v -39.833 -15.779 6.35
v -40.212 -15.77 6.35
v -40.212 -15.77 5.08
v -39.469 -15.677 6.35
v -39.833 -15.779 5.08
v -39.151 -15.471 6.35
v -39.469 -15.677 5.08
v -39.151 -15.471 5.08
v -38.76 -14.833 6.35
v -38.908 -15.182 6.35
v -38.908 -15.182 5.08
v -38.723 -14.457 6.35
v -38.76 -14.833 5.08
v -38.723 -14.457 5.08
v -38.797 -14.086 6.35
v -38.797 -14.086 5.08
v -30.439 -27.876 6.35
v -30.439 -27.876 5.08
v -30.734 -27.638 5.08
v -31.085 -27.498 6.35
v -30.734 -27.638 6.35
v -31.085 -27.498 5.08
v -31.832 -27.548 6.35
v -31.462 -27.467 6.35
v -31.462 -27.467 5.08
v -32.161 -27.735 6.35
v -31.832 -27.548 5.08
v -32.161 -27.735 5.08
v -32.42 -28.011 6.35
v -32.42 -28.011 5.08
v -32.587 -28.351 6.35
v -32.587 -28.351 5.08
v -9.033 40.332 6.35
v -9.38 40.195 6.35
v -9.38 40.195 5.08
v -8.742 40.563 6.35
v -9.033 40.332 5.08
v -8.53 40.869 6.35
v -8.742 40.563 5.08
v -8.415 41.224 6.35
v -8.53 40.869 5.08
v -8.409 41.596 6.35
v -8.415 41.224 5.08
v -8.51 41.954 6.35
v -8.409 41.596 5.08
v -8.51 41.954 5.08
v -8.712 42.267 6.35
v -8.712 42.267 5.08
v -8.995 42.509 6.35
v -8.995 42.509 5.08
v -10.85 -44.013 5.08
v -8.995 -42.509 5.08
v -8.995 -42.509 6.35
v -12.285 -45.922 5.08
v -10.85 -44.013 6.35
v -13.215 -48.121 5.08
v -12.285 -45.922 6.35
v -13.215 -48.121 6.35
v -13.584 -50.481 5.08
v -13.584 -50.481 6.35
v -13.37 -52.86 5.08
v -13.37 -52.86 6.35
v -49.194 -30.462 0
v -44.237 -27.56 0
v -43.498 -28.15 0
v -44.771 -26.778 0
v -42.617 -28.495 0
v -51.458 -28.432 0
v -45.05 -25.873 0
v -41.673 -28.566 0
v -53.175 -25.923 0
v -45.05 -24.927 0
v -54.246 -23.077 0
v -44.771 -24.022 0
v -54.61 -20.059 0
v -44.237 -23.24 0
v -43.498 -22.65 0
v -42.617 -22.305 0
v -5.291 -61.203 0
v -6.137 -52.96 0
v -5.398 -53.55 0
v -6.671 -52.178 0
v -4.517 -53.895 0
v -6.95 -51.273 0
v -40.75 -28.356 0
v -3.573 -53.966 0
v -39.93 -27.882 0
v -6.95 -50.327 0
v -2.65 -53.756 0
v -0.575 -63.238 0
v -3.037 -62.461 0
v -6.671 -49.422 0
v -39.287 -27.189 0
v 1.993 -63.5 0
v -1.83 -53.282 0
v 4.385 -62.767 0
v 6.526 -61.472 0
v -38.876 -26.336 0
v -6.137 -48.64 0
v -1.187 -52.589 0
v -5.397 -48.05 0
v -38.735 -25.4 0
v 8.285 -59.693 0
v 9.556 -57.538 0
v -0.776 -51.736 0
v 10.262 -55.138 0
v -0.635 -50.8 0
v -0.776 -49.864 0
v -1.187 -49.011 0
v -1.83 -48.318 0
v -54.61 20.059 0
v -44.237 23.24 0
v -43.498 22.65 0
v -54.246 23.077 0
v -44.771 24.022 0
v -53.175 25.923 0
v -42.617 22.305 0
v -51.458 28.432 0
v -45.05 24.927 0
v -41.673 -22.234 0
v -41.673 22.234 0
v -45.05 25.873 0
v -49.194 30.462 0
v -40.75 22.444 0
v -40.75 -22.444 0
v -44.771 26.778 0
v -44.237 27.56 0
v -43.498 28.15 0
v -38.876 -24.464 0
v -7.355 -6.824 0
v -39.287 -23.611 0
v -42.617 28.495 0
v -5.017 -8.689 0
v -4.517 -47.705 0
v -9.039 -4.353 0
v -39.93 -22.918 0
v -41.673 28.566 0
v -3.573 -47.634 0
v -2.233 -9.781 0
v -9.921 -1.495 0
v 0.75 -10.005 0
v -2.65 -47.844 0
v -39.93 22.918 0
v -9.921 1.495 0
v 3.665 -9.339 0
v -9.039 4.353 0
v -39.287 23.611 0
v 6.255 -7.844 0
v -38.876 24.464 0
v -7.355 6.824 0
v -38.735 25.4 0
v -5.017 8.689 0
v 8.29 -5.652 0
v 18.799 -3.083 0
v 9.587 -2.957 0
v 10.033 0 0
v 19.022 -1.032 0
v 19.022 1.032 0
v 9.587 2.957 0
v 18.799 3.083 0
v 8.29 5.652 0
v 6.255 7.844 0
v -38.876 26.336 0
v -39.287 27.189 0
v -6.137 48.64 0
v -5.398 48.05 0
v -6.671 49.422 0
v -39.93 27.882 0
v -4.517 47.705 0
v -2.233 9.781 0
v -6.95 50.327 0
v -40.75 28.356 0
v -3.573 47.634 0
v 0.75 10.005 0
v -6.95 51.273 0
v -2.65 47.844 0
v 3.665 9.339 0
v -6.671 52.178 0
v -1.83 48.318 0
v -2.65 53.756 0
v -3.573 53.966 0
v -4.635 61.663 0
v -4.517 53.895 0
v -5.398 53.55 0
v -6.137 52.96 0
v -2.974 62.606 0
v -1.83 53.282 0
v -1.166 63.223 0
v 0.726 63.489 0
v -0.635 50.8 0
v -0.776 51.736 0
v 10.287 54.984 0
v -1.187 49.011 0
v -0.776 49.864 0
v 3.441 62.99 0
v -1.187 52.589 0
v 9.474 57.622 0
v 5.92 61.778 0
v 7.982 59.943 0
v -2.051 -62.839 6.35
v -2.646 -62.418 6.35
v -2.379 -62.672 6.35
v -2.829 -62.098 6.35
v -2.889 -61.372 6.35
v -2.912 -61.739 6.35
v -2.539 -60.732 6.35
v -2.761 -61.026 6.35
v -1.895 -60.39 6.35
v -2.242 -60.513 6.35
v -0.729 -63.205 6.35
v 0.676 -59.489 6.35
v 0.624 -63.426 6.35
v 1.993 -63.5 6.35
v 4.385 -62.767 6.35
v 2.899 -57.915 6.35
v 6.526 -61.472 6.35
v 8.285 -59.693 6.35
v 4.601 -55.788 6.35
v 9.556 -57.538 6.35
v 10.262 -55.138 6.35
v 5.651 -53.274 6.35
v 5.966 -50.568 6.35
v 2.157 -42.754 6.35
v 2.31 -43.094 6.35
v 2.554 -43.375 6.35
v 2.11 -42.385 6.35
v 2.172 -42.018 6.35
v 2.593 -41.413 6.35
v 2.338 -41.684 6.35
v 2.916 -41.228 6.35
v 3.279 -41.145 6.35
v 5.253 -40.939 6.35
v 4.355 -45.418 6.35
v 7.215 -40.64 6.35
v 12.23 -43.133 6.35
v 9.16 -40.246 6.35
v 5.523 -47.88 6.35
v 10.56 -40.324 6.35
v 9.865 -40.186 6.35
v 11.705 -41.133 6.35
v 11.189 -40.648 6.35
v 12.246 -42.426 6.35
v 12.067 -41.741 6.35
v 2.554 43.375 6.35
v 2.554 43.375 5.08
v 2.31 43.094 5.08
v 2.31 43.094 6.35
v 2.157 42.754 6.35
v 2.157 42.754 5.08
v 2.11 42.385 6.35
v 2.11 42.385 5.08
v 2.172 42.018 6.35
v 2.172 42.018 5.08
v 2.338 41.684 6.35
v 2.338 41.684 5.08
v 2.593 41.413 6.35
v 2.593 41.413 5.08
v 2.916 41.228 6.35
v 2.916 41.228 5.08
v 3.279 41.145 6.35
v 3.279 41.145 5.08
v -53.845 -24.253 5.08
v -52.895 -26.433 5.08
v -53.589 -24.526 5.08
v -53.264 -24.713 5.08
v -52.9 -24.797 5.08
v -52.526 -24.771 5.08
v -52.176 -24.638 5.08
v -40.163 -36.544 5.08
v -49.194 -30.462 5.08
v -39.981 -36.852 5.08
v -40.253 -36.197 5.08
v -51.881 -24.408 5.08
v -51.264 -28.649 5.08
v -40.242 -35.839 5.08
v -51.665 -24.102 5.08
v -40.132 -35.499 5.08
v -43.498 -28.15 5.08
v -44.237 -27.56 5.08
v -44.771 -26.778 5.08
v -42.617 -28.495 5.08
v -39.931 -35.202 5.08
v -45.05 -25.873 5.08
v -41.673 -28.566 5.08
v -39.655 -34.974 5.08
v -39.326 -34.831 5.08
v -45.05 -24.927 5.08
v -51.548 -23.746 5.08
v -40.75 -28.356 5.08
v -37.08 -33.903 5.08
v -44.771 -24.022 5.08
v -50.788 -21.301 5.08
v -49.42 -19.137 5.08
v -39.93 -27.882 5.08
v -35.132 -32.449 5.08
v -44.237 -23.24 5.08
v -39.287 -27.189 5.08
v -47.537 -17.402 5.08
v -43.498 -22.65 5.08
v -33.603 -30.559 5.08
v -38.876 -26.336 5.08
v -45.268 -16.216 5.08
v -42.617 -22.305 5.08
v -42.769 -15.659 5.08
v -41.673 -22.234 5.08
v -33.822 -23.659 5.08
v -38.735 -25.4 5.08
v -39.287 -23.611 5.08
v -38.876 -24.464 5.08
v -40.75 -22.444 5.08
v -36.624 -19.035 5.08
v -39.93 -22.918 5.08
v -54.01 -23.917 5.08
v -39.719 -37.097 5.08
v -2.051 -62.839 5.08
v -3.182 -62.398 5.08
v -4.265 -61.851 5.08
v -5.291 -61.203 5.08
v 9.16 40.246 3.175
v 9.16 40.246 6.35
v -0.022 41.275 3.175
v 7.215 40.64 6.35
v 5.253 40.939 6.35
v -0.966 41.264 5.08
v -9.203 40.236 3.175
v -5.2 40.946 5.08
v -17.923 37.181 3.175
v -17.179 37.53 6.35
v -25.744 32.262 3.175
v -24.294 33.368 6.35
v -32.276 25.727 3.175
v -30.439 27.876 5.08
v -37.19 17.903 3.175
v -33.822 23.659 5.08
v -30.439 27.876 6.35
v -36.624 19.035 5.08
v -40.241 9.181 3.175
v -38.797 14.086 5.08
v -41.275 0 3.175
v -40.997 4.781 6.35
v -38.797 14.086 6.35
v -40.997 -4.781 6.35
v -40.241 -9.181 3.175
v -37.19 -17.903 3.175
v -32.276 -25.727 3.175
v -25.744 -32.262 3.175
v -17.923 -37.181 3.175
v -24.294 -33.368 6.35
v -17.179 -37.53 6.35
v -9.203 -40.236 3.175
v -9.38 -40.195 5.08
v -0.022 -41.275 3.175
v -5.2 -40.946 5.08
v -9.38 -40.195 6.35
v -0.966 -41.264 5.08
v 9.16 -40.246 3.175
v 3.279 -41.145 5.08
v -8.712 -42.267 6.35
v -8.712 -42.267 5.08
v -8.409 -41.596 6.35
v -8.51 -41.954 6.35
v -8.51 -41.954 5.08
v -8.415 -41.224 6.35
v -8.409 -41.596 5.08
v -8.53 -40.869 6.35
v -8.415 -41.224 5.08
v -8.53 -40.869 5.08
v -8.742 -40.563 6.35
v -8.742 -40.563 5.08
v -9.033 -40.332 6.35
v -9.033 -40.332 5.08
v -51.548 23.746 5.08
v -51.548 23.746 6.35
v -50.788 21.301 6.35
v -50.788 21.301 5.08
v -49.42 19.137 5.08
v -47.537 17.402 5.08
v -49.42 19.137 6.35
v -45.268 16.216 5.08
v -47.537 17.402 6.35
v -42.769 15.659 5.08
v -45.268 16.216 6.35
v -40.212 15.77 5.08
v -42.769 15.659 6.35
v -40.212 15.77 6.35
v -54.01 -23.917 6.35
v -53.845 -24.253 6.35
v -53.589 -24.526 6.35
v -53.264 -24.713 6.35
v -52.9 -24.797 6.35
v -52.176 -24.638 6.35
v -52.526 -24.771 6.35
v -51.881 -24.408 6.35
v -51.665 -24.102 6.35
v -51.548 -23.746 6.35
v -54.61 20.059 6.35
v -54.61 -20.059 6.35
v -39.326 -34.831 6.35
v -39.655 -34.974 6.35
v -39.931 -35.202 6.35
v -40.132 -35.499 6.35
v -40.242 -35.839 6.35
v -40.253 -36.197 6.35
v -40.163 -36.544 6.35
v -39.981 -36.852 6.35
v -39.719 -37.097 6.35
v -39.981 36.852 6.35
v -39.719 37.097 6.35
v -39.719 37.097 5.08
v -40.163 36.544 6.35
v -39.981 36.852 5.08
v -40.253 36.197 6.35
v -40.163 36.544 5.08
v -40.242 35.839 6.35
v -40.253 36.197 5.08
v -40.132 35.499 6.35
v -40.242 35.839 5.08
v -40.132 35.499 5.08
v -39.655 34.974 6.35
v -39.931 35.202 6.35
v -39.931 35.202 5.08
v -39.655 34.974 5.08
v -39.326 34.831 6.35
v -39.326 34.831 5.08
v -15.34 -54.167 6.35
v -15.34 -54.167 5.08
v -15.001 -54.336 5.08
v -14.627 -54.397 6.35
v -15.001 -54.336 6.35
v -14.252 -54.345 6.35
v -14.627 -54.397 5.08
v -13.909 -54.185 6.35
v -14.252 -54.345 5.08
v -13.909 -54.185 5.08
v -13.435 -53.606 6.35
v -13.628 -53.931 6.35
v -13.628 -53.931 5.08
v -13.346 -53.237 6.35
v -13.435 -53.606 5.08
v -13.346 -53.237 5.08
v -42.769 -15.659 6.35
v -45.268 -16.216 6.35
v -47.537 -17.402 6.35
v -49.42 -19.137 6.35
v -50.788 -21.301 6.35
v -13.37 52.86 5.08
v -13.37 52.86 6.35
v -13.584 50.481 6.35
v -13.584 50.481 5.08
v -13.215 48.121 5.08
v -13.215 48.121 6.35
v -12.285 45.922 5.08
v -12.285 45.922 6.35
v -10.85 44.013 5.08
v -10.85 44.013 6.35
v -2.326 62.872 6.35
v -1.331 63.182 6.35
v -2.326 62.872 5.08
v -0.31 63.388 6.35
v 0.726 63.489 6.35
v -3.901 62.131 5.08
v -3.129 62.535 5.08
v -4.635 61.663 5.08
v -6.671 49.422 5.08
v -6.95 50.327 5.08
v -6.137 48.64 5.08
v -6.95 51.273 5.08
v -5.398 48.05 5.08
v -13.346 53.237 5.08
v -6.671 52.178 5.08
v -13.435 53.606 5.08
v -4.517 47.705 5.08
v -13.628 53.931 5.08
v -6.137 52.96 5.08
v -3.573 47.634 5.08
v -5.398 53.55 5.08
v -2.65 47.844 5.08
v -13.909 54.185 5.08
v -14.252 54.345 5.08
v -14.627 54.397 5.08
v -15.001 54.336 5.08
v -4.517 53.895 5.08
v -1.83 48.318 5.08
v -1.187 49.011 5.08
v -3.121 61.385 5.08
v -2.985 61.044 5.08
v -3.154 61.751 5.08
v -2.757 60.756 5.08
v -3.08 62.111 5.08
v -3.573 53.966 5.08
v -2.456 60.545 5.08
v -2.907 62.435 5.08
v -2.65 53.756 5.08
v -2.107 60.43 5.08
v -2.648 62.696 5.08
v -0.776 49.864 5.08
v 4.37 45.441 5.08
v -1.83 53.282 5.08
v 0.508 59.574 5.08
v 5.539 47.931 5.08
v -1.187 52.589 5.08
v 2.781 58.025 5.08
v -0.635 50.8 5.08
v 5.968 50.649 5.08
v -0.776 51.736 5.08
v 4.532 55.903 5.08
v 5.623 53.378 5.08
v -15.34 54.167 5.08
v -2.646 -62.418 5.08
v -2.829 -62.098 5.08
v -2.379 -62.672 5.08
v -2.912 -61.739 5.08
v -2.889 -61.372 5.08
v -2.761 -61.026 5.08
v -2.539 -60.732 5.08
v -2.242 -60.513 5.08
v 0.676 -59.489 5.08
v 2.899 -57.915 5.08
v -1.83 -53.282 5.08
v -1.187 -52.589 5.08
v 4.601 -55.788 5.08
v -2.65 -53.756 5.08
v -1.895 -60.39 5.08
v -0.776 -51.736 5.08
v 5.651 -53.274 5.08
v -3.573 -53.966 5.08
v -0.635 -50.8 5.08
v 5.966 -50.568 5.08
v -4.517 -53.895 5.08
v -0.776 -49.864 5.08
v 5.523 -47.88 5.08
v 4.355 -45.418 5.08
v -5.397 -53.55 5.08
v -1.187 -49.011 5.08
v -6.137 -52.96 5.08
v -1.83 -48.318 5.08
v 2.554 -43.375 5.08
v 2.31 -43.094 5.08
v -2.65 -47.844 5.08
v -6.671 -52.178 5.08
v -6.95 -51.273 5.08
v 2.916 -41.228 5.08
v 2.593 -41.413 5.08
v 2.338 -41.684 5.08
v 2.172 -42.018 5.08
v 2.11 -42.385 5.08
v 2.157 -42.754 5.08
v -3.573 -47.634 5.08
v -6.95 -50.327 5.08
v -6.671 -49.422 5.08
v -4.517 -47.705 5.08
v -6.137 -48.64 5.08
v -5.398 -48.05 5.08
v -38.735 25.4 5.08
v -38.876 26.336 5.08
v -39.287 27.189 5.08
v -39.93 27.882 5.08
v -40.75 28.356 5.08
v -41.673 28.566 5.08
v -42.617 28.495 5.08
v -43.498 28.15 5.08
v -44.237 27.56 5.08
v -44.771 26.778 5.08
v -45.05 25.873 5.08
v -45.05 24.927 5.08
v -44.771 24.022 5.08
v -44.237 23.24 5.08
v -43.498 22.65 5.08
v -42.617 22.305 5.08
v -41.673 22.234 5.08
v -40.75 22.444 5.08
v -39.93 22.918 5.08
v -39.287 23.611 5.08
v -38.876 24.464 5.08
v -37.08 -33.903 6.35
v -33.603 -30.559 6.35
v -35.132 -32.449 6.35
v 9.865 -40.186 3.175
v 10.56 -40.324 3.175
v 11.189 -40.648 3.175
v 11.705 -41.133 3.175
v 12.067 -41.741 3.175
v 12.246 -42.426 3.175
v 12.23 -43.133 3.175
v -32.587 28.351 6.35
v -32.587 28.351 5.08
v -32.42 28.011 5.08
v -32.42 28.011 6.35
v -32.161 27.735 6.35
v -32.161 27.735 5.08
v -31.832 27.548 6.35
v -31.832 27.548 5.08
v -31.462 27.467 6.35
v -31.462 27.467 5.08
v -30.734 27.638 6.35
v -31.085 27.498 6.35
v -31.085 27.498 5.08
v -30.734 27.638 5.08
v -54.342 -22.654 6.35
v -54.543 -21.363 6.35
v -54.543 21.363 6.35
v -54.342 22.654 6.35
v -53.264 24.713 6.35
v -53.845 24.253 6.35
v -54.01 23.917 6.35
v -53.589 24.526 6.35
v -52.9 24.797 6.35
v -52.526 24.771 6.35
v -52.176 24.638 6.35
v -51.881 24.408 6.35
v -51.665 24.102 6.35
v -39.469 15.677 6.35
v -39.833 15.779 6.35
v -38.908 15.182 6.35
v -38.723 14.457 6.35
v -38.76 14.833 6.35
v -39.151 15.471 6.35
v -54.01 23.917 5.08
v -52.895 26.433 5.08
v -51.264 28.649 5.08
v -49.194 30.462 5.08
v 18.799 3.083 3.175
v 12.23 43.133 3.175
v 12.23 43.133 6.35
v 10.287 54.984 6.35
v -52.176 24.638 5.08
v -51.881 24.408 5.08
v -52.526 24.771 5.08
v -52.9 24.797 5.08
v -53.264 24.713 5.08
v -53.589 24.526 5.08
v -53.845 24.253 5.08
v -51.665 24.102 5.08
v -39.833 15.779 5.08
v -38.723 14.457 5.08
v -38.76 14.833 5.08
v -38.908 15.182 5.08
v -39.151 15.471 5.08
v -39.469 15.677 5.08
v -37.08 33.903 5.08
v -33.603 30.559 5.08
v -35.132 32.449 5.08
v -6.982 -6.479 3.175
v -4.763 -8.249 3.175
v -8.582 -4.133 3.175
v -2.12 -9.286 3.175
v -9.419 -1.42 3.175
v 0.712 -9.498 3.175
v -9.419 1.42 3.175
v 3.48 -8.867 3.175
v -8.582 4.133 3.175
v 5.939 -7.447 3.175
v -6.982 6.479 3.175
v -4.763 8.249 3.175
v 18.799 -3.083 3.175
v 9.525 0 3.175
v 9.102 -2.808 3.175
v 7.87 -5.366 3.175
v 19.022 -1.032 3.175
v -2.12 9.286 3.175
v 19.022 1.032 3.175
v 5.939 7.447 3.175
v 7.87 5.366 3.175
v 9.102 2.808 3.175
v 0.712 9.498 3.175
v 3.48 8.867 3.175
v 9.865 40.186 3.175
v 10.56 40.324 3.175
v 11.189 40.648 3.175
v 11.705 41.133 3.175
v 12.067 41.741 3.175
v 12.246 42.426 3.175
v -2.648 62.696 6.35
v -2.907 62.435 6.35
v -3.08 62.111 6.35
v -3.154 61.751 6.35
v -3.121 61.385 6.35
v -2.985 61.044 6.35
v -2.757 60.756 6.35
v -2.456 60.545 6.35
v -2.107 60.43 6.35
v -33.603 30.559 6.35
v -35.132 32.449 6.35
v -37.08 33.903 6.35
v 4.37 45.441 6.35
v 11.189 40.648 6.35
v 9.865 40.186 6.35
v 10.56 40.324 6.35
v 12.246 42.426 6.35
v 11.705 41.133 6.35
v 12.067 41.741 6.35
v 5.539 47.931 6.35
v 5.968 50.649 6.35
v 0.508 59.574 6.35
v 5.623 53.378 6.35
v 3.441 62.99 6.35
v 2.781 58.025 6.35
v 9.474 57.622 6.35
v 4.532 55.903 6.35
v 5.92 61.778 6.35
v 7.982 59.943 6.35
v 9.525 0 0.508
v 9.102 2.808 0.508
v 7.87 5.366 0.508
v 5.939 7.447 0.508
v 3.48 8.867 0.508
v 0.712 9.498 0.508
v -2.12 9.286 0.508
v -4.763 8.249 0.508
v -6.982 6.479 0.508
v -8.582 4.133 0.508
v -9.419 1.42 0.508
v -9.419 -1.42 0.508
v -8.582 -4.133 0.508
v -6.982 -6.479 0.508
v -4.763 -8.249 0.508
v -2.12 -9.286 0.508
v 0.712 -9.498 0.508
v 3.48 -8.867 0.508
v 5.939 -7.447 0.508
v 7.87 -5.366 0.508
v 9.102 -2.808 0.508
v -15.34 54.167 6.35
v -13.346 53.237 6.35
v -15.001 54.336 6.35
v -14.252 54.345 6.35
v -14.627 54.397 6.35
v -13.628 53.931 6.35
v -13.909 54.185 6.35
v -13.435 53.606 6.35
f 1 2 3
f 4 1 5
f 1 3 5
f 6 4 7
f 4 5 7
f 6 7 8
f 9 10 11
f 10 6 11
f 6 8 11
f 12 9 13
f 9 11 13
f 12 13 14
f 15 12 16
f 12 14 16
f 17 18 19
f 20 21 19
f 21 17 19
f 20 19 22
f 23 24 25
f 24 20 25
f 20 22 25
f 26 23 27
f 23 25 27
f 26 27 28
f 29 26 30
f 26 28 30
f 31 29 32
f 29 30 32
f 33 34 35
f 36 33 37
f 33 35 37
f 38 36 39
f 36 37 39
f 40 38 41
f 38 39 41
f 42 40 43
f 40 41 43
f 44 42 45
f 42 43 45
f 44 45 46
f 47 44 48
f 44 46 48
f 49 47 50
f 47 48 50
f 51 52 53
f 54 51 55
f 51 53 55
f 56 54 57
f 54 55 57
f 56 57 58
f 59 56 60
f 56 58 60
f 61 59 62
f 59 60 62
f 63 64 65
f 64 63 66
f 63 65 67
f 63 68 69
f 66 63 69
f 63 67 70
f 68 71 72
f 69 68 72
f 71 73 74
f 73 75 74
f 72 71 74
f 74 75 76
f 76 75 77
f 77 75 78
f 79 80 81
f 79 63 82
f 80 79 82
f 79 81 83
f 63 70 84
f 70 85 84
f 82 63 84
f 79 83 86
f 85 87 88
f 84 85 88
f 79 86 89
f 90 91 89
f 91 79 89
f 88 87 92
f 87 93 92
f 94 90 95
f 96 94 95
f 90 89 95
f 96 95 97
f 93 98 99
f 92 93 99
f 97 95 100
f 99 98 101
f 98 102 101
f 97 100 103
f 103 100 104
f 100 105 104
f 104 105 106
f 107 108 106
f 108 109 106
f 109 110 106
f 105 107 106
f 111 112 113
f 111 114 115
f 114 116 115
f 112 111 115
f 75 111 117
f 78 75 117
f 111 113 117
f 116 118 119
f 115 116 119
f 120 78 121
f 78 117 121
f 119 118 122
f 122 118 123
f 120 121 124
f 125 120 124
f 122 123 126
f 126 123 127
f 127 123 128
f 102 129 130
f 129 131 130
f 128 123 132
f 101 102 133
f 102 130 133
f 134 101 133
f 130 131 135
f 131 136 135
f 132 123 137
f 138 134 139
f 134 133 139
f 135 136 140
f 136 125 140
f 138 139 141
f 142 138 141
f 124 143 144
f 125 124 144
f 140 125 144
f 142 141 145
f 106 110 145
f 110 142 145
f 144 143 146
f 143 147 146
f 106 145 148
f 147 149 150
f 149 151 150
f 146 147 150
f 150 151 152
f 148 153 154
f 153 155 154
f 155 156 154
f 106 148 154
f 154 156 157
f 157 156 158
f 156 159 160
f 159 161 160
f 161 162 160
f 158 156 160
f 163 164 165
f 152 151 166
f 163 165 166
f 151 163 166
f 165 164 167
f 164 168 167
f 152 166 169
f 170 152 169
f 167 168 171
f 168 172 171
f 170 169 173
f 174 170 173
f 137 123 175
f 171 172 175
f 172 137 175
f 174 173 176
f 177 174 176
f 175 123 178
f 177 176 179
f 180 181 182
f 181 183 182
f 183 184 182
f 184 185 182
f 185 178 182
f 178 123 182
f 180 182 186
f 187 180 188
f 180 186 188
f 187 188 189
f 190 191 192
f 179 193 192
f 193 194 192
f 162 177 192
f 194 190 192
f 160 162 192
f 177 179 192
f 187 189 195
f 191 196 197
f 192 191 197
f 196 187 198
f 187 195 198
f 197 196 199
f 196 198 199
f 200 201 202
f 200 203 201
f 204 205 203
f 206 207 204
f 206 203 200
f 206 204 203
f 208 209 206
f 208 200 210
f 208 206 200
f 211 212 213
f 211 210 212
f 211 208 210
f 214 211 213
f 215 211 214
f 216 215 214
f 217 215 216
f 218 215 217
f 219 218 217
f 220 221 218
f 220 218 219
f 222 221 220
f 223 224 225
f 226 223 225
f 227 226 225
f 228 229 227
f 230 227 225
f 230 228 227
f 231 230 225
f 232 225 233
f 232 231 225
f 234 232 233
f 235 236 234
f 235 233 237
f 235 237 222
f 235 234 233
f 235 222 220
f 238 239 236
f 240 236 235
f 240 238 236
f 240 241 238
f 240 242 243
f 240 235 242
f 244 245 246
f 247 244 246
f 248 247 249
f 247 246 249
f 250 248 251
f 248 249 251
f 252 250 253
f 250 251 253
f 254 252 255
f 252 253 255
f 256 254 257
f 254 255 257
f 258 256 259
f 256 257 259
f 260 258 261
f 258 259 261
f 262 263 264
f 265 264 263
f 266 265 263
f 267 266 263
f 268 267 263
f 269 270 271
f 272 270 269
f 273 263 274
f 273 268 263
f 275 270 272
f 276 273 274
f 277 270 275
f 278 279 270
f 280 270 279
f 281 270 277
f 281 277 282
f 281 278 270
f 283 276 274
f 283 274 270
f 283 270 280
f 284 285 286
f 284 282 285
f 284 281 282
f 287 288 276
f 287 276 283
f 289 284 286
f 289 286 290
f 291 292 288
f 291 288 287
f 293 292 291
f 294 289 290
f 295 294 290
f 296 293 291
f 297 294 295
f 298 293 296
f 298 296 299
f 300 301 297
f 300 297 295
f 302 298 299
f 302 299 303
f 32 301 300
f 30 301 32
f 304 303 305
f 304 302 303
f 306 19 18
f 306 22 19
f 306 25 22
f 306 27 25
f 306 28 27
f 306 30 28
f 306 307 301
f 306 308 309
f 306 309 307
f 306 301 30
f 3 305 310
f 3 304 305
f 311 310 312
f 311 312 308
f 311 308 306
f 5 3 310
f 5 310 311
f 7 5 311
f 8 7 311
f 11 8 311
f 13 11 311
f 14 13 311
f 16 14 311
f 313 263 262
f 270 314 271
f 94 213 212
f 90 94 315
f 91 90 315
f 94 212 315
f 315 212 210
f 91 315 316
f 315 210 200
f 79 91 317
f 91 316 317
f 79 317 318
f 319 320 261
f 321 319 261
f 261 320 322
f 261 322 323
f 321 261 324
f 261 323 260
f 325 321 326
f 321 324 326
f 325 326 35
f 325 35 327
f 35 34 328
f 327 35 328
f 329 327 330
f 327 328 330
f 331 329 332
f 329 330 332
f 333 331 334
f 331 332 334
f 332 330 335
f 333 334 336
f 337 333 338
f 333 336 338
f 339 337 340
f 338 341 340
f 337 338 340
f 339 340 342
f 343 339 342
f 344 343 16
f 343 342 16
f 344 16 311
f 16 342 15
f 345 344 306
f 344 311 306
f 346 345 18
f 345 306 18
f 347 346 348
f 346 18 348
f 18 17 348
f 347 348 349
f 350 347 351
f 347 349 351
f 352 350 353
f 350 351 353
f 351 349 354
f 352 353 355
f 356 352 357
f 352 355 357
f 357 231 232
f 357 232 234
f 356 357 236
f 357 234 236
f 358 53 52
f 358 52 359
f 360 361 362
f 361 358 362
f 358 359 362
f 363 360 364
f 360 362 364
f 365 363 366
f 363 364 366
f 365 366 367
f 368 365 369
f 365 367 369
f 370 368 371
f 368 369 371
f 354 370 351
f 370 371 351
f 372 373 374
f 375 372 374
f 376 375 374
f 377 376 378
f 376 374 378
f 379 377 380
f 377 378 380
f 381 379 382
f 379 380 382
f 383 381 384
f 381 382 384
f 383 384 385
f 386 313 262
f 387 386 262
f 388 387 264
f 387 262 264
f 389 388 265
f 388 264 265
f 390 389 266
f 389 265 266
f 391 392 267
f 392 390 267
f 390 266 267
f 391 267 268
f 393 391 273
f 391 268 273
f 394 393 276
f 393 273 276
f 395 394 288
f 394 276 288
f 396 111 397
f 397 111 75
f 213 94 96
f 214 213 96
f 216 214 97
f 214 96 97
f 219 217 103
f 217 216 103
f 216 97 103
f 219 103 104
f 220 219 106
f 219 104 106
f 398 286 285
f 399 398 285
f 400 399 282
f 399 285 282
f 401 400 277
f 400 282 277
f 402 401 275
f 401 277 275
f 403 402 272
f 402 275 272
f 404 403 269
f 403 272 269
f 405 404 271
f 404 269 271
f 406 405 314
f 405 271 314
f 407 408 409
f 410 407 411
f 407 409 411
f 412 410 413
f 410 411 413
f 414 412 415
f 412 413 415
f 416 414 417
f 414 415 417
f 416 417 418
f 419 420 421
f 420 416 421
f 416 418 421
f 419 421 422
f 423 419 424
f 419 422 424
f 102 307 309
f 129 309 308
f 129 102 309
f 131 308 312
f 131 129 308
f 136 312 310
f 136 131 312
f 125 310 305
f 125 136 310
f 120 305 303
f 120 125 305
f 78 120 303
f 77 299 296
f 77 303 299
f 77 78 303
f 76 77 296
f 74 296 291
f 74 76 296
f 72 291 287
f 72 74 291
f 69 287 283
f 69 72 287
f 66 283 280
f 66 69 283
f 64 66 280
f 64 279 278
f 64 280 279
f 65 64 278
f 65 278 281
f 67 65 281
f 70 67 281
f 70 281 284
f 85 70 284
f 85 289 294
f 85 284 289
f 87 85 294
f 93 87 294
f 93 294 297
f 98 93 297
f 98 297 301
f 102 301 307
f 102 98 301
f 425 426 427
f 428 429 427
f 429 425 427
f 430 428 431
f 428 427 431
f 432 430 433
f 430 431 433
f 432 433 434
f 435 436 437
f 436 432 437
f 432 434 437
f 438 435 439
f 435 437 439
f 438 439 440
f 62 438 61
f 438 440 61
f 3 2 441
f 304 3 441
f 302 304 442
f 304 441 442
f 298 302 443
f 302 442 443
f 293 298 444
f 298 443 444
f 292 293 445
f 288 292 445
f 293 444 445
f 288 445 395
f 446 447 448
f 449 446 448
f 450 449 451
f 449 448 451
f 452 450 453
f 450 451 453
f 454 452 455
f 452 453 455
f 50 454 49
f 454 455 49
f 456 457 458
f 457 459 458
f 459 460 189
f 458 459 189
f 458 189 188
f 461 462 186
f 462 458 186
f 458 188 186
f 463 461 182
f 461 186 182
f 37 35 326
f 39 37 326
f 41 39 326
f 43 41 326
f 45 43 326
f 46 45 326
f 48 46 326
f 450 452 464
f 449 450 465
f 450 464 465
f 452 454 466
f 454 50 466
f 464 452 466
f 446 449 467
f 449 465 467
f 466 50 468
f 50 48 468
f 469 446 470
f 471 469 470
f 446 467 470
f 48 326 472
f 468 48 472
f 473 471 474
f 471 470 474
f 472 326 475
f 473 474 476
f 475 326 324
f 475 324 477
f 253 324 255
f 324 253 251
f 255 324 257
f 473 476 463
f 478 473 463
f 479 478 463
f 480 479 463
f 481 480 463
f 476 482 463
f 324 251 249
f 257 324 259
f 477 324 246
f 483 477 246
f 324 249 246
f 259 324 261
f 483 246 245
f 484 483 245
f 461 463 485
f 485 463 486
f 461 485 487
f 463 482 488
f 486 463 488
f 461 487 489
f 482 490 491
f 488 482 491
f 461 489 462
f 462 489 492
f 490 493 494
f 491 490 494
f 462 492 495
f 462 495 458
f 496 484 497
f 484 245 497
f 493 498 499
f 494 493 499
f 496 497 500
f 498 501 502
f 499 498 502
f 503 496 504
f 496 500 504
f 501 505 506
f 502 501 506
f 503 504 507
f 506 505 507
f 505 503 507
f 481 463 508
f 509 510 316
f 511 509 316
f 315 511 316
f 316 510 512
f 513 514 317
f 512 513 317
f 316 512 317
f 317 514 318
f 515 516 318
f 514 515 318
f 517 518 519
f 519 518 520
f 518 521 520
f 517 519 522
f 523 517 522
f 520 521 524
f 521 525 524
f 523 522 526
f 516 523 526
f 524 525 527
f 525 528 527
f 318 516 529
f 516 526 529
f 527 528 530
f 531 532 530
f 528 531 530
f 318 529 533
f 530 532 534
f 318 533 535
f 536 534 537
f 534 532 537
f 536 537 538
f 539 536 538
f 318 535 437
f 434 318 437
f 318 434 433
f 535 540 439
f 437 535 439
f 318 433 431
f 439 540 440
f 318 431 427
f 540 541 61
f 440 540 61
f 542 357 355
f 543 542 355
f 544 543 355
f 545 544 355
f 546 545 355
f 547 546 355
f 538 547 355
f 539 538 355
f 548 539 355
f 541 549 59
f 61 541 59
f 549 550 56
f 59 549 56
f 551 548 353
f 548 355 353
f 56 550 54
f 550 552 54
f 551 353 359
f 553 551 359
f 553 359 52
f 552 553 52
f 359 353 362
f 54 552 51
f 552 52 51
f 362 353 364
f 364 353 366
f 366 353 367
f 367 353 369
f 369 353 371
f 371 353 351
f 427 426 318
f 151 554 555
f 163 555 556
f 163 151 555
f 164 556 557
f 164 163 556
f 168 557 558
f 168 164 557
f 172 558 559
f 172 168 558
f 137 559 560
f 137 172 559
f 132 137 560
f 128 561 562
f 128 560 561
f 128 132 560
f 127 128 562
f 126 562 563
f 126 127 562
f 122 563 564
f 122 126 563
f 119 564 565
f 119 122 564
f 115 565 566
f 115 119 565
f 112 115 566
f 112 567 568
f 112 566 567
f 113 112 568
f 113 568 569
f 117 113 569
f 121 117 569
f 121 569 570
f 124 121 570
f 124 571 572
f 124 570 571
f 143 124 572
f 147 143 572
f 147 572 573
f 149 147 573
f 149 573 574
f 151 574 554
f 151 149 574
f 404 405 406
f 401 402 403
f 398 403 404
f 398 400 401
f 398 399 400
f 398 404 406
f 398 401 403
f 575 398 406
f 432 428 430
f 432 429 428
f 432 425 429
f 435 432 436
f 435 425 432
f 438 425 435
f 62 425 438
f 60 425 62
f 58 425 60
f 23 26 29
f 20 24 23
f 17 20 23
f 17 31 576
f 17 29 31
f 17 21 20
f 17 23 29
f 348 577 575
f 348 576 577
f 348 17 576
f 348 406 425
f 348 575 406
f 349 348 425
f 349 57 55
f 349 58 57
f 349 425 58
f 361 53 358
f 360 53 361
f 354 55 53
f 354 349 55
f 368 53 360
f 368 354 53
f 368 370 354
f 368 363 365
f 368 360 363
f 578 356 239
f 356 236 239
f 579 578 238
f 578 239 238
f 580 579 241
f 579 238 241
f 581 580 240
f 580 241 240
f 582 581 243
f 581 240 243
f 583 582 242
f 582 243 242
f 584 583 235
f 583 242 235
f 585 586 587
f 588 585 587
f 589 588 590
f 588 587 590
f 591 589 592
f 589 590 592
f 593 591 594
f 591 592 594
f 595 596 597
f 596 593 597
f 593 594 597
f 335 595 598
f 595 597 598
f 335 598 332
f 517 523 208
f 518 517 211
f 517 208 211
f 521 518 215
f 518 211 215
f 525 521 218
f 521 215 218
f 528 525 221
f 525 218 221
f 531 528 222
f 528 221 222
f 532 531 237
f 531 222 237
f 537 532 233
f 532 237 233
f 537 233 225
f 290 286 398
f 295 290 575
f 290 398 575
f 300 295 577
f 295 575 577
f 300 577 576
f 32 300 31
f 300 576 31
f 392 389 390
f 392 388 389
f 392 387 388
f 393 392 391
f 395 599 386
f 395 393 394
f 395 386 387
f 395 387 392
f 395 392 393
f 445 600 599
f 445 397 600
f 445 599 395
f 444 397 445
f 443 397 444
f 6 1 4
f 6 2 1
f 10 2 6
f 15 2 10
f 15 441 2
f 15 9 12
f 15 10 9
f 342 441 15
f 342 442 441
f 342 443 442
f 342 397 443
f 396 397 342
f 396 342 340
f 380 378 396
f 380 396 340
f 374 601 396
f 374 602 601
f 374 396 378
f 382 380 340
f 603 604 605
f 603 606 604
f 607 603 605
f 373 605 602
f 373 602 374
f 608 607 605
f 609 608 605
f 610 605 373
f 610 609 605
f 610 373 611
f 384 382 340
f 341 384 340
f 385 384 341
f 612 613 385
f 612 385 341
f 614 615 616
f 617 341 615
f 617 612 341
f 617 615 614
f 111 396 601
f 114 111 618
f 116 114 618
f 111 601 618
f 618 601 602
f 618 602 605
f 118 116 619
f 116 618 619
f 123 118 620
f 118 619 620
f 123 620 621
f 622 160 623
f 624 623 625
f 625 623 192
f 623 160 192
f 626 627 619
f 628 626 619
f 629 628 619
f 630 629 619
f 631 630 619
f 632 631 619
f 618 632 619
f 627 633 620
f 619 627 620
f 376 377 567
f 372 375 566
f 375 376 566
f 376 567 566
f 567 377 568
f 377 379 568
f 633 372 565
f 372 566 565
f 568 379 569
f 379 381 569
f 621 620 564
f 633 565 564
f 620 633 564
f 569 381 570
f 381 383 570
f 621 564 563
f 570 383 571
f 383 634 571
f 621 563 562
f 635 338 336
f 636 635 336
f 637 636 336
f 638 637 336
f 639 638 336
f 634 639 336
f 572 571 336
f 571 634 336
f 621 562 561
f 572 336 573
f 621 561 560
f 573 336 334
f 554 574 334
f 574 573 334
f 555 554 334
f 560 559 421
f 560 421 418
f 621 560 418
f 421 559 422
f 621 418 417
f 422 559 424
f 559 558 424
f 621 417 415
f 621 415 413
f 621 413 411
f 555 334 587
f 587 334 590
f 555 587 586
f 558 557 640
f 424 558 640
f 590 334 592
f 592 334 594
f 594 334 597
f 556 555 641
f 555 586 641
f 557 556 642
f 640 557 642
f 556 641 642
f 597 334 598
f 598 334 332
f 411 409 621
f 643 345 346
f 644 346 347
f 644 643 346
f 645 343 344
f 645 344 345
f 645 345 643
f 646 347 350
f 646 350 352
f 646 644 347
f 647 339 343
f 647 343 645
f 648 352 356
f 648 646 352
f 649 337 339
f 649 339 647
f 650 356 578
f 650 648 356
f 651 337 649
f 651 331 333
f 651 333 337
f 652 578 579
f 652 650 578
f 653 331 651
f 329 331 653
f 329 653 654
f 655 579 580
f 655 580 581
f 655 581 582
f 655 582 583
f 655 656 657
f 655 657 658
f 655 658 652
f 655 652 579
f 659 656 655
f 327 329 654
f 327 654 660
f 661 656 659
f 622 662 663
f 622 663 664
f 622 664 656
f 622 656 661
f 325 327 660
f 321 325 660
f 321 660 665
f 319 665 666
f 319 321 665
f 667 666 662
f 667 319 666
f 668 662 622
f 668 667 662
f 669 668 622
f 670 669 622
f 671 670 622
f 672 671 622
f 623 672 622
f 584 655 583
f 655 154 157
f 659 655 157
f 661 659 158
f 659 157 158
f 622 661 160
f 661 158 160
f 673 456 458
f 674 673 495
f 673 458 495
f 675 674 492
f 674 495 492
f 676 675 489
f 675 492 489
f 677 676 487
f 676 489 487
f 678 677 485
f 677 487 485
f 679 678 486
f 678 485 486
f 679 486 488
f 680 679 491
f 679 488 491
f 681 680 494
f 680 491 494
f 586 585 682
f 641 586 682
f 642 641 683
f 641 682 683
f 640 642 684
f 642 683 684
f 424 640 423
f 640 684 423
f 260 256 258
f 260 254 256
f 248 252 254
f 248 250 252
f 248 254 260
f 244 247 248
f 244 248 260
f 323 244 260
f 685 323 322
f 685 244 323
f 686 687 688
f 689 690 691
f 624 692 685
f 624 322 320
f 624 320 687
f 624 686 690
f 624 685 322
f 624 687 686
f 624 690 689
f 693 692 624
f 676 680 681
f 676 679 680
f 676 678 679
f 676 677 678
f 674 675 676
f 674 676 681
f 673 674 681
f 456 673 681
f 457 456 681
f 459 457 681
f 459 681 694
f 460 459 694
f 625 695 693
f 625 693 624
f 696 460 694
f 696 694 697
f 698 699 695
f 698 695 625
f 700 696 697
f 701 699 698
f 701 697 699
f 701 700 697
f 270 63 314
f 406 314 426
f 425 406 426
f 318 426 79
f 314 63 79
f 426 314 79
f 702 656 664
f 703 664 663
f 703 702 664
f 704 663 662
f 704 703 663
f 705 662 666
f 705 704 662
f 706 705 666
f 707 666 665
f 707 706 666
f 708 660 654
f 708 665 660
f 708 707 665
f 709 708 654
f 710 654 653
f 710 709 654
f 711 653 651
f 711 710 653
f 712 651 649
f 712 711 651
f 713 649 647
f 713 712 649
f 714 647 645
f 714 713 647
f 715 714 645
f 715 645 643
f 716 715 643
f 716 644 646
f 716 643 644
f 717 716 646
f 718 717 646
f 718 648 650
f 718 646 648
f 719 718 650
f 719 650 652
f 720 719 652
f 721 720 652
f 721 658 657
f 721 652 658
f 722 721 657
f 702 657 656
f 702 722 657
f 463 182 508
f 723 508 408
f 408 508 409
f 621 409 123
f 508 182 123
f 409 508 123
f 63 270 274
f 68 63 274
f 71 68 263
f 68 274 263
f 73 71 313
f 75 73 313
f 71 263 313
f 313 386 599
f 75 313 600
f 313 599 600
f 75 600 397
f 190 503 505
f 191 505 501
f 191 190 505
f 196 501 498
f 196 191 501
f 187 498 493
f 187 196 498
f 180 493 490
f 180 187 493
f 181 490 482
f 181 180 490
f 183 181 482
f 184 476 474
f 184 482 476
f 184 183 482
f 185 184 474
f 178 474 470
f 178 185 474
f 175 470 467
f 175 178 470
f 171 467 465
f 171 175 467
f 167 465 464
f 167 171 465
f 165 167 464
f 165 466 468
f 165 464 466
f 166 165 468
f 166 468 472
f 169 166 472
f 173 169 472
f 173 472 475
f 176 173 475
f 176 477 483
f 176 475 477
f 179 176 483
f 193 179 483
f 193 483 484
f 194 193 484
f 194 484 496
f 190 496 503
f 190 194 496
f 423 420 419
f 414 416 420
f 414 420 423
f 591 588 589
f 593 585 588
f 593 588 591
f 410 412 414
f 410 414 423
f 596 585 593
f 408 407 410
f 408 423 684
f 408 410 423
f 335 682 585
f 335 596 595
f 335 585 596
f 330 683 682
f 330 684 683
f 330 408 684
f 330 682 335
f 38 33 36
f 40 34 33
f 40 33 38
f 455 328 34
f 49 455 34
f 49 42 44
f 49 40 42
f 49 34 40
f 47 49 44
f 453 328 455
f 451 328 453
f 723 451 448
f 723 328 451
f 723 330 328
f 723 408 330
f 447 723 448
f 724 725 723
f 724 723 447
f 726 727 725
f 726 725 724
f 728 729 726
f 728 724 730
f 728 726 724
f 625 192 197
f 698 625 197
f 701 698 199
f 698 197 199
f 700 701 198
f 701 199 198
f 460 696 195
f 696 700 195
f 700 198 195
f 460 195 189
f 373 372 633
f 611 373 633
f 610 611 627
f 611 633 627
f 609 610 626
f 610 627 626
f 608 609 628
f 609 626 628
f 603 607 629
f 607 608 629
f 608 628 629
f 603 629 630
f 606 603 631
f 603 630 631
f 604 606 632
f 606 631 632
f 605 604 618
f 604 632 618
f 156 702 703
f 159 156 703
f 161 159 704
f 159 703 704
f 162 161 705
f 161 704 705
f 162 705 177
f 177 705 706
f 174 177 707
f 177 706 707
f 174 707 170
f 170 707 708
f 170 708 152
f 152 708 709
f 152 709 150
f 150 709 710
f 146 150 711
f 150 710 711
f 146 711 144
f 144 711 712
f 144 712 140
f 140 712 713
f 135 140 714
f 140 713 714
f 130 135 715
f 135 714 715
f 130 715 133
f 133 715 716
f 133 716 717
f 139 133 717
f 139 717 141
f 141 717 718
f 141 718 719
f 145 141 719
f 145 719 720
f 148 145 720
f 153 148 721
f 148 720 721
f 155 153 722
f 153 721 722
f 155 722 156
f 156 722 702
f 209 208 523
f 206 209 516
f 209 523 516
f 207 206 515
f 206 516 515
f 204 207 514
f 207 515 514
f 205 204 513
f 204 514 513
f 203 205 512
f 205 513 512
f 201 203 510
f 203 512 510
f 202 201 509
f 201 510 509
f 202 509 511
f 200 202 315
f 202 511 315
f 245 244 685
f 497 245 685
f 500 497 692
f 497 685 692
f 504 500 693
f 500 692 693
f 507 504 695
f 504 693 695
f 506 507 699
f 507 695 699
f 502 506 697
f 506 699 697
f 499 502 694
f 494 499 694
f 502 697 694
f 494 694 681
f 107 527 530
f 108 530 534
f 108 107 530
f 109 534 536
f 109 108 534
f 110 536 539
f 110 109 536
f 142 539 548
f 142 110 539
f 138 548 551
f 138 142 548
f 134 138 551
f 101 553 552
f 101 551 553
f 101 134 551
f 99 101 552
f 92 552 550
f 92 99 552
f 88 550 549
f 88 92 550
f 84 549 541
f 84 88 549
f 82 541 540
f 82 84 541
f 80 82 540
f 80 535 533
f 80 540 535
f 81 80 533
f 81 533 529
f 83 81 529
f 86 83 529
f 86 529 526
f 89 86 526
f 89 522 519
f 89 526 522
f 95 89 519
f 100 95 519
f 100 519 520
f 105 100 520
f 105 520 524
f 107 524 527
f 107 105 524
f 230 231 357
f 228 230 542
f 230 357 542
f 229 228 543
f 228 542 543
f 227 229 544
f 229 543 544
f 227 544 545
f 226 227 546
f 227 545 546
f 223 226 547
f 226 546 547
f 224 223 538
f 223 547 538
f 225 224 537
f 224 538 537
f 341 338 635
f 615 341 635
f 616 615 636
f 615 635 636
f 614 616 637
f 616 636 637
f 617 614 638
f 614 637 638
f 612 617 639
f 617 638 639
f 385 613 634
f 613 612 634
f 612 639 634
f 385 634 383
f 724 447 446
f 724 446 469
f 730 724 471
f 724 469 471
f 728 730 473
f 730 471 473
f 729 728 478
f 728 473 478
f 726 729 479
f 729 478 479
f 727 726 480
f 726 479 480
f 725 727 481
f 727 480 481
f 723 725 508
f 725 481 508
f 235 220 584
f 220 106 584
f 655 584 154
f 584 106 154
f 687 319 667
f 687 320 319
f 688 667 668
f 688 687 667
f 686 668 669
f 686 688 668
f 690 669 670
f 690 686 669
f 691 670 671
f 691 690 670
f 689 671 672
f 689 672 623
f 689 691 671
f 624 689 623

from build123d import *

# Parameters (mm, degrees)
SKETCH1_R           = 3.174999999999998
SKETCH1_R_2         = 3.1750000000000105
SKETCH1_R_3         = 3.17500000000001
SKETCH1_R_4         = 9.525
BOSS_EXTRUDE1_DEPTH = 6.35
SKETCH12_R          = 41.275000000000006
CUT_EXTRUDE3_DEPTH  = 3.175
FILLET3_R           = 12.7
FILLET5_R           = 10.16
FILLET6_R           = 12.7
CHAMFER1_SIZE       = 0.508
SKETCH16_R          = 9.779
SKETCH16_R_2        = 9.778999999999995
CUT_EXTRUDE6_DEPTH  = 1.27
FILLET7_R           = 1.27
FILLET8_R           = 2.54


with BuildPart() as part:
    # Sketch1 → Boss-Extrude1 (new body)
    with BuildSketch(Plane.XY):
        with BuildLine():
            Line((8.889999999999999, -63.5), (18.798846105166316, -3.0831615452767167))
            ThreePointArc((18.79884610516632, -3.0831615452767163), (19.049999999999997, -4.4e-16), (18.798846105166323, 3.083161545276716))
            Line((18.798846105166316, 3.083161545276716), (8.889999999999999, 63.5))
            Line((8.889999999999999, 63.5), (-2.0113089116884844, 63.5))
            Line((-2.011308911688488, 63.5), (-54.610000000000014, 26.669999999999998))
            Line((-54.61000000000001, 26.67), (-54.61000000000001, -26.67))
            Line((-54.610000000000014, -26.669999999999998), (-2.011308911688488, -63.5))
            Line((-2.011308911688488, -63.5), (8.89, -63.5))
        make_face()
        with Locations((-41.910000000000004, -25.4)):
            Circle(SKETCH1_R, mode=Mode.SUBTRACT)
        with Locations((-3.8099999999999934, -50.8)):
            Circle(SKETCH1_R_2, mode=Mode.SUBTRACT)
        with Locations((-41.910000000000004, 25.4)):
            Circle(SKETCH1_R, mode=Mode.SUBTRACT)
        with Locations((-3.8100000000000063, 50.8)):
            Circle(SKETCH1_R_3, mode=Mode.SUBTRACT)
        Circle(SKETCH1_R_4, mode=Mode.SUBTRACT)
    extrude(amount=BOSS_EXTRUDE1_DEPTH)

    # Sketch12 → Cut-Extrude3 (cut)
    with BuildSketch(Plane.XY.offset(6.35)):
        Circle(SKETCH12_R)
    extrude(amount=-CUT_EXTRUDE3_DEPTH, mode=Mode.SUBTRACT)

    # Fillet3
    fillet3_edges = [part.edges().sort_by_distance(p)[0] for p in [
        (-2.011308911688488, -63.5, 3.175),
        (-54.610000000000014, -26.67, 3.175),
    ]]
    fillet(fillet3_edges, radius=FILLET3_R)

    # Fillet5
    # the kernel refuses this fillet: 10.16 mm, written as the material it takes off along each edge
    with BuildSketch(Plane(origin=(8.889999999999999, 63.5, -21.57354203982315), x_dir=(-1, 0, 0), z_dir=(0, 0, 1))) as fillet5_piece_1:
        with BuildLine():
            CenterArc((FILLET5_R * 0.849352048812, FILLET5_R), FILLET5_R, 189.31404643684508, 80.68595356315495)
            Line((-FILLET5_R * 0.137464019701, FILLET5_R * 0.838154249592), (0, 0))
            Line((0, 0), (FILLET5_R * 0.849352048812, 0))
        make_face()
    extrude(amount=49.4970840796463, mode=Mode.SUBTRACT)
    with BuildSketch(Plane(origin=(-2.011308911688486, 63.5, -8.008589237526252), x_dir=(-0.8191520442889891, -0.5735764363510498, 0), z_dir=(0, 0, 1))) as fillet5_piece_2:
        with BuildLine():
            CenterArc((FILLET5_R * 0.315298788879, FILLET5_R), FILLET5_R, 234.99999999999972, 35.000000000000284)
            Line((-FILLET5_R * 0.258277647472, FILLET5_R * 0.180847955711), (0, 0))
            Line((0, 0), (FILLET5_R * 0.315298788879, 2e-17))
        make_face()
    extrude(amount=22.36717847505251, mode=Mode.SUBTRACT)
    with BuildSketch(Plane(origin=(8.89, -63.5, -21.185509481386156), x_dir=(-1, -1.03e-15, 0), z_dir=(0, 0, 1))) as fillet5_piece_3:
        with BuildLine():
            CenterArc((8.654537384170473, -10.006833294491324), FILLET5_R, 99.961393021195, 70.72456054195987)
            Line((-1.3715138719182247, -8.362480470343732), (0, 0))
            Line((0, 0), (6.897014292925349, 0))
        make_face()
    extrude(amount=48.721018962772305, mode=Mode.SUBTRACT)

    # Fillet6
    fillet6_edges = [part.edges().sort_by_distance(p)[0] for p in [
        (-54.610000000000014, 26.67, 3.175),
    ]]
    fillet(fillet6_edges, radius=FILLET6_R)

    # Chamfer1
    chamfer1_edges = [part.edges().sort_by_distance(p)[0] for p in [
        (-9.525, 1.17e-15, 0),
    ]]
    chamfer(chamfer1_edges, length=CHAMFER1_SIZE)

    # Sketch16 → Cut-Extrude6 (cut)
    with BuildSketch(Plane.XY.offset(6.35)):
        with Locations((-3.8100000000000063, 50.8)):
            Circle(SKETCH16_R)
        with Locations((-41.910000000000004, 25.4)):
            Circle(SKETCH16_R_2)
        with Locations((-41.910000000000004, -25.4)):
            Circle(SKETCH16_R_2)
        with Locations((-3.8099999999999934, -50.8)):
            Circle(SKETCH16_R)
    extrude(amount=-CUT_EXTRUDE6_DEPTH, mode=Mode.SUBTRACT)

    # Fillet7
    # the kernel refuses this fillet: 1.27 mm, written as the material it takes off along each edge
    with BuildSketch(Plane(origin=(-51.05033996469843, 28.876064776401133, 5.08), x_dir=(-0.09657343245290265, -0.9953258622904685, 0), z_dir=(0, 0, 1))) as fillet7_piece_1:
        with BuildLine():
            CenterArc((5.488895056500577, -1.2251054888152173), FILLET7_R, 105.27988641723195, 152.57651314637792)
            ThreePointArc((5.2217345964190285, -2.46668725759608), (2.468798122573326, -1.5340901167119672), (0, 0))
            ThreePointArc((0, 0), (2.5771031667716113, -0.34568773612281406), (5.154206333543225, 2e-17))
        make_face()
    extrude(amount=15.707593770740127, mode=Mode.SUBTRACT)
    with BuildSketch(Plane(origin=(-51.05033996469843, -28.876064776401122, 5.08), x_dir=(-0.09657343245290317, 0.9953258622904685, 0), z_dir=(0, 0, 1))) as fillet7_piece_2:
        with BuildLine():
            CenterArc((5.488895056500547, 1.2251054888152175), FILLET7_R, 102.14360043639026, 152.57651314637792)
            ThreePointArc((5.221734596418995, 2.4666872575960808), (2.468798122573309, 1.5340901167119605), (0, 0))
            ThreePointArc((0, 0), (2.577103166771601, 0.3456877361228138), (5.154206333543198, 2e-17))
        make_face()
    extrude(amount=15.707593770740052, mode=Mode.SUBTRACT)
    with BuildSketch(Plane(origin=(-4.405896500363429, -41.03917276247275, 5.08), x_dir=(-0.9859045184277648, 0.16730893742928732, 0), z_dir=(0, 0, 1))) as fillet7_piece_3:
        with BuildLine():
            CenterArc((5.122467383032978, 1.267626206798734), FILLET7_R, 131.65076211968278, 134.84555428453902)
            ThreePointArc((4.278440018803308, 2.2165823746123587), (2.277882855344697, 0.8406446175243522), (0, 0))
            ThreePointArc((0, 0), (2.522427120432931, 0.07714827904124132), (5.044854240865812, -6e-17))
        make_face()
    extrude(amount=13.88213560216453, mode=Mode.SUBTRACT)
    with BuildSketch(Plane(origin=(-1.764835382793802, -41.237252346290475, 5.08), x_dir=(0.9998310962098215, 0.01837876633146887, 0), z_dir=(0, 0, 1))) as fillet7_piece_4:
        with BuildLine():
            CenterArc((5.1224673830329825, -1.267626206798732), FILLET7_R, 93.5036835957782, 134.84555428453882)
            ThreePointArc((4.27844001880331, -2.216582374612353), (2.2778828553446977, -0.8406446175243475), (0, 0))
            ThreePointArc((0, 0), (2.522427120432899, -0.07714827904124524), (5.044854240865816, 0))
        make_face()
    extrude(amount=13.88213560216454, mode=Mode.SUBTRACT)
    with BuildSketch(Plane(origin=(-1.7648353827938124, 41.237252346290475, 5.08), x_dir=(0.9998310962098215, -0.018378766331468933, 0), z_dir=(0, 0, 1))) as fillet7_piece_5:
        with BuildLine():
            CenterArc((5.122467383032965, 1.267626206798732), FILLET7_R, 131.65076211968247, 134.84555428453936)
            ThreePointArc((4.278440018803301, 2.21658237461236), (2.277882855344692, 0.8406446175243475), (0, 0))
            ThreePointArc((0, 0), (2.5224271204329014, 0.07714827904124544), (5.044854240865799, 0))
        make_face()
    extrude(amount=13.882135602164494, mode=Mode.SUBTRACT)
    with BuildSketch(Plane(origin=(-4.40589650036344, 41.03917276247275, 5.08), x_dir=(-0.9859045184277646, -0.1673089374292877, 0), z_dir=(0, 0, 1))) as fillet7_piece_6:
        with BuildLine():
            CenterArc((5.122467383032965, -1.2676262067987338), FILLET7_R, 93.50368359577817, 134.84555428453905)
            ThreePointArc((4.278440018803295, -2.2165823746123583), (2.2778828553446893, -0.8406446175243446), (0, 0))
            ThreePointArc((0, 0), (2.5224271204328996, -0.07714827904124434), (5.044854240865799, -2e-17))
        make_face()
    extrude(amount=13.882135602164501, mode=Mode.SUBTRACT)
    with BuildSketch(Plane(origin=(-11.473504174062986, 56.87449954927312, 5.08), x_dir=(-0.42704799488174705, -0.9042289588746201, 0), z_dir=(0, 0, 1))) as fillet7_piece_7:
        with BuildLine():
            CenterArc((4.728427365439227, -1.2368396432560318), FILLET7_R, 103.12184472435666, 137.15851910421196)
            Line((4.098816822386599, -2.3397859538609374), (0, 0))
            ThreePointArc((0, 0), (2.2200543118220843, -0.25533474692856073), (4.440108623644155, 3e-17))
        make_face()
    extrude(amount=13.069072435302997, mode=Mode.SUBTRACT)
    with BuildSketch(Plane(origin=(-6.897089605429491, 60.07893952820306, 5.08), x_dir=(0.997331674160986, 0.07300364179439761, 0), z_dir=(0, 0, 1))) as fillet7_piece_8:
        with BuildLine():
            CenterArc((5.114789119152491, 1.2311102698497796), FILLET7_R, 106.07013934022241, 149.71417700442854)
            Line((4.763235479566721, 2.4514831794532332), (4.728080115608144, 2.5735204704135772))
            ThreePointArc((4.728080115608144, 2.5735204704135772), (2.3062016688784, 1.523381308565702), (-0.0650550978688258, 0.1090726099498725))
            Line((-0.0650550978688258, 0.1090726099498725), (0.03118773853141711, -0.12311102698497907))
            ThreePointArc((0.03118773853141711, -0.12311102698497907), (2.401455866919156, 0.17245092215670987), (4.771723995306896, -0.12311102698497724))
            Line((4.771723995306896, -0.12311102698497724), (4.802911733838314, 2e-17))
        make_face()
    extrude(amount=14.662671039822802, mode=Mode.SUBTRACT)
    with BuildSketch(Plane(origin=(-42.48178221863479, 35.16226951556107, 5.08), x_dir=(0.9945508568129161, -0.1042525453535521, 0), z_dir=(0, 0, 1))) as fillet7_piece_9:
        with BuildLine():
            CenterArc((3.378842887065313, 1.2531771116180899), FILLET7_R, 130.98410421956518, 129.67977154849987)
            Line((2.5459138672912713, 2.211889397978423), (0, 0))
            ThreePointArc((0, 0), (1.5864079408782286, 0.12953624054069557), (3.172815881756456, -1e-17))
        make_face()
    extrude(amount=9.701389316326873, mode=Mode.SUBTRACT)
    with BuildSketch(Plane(origin=(-37.82742730230863, 16.513974951190757, 5.08), x_dir=(-0.3708645160377428, -0.9286869821118904, 0), z_dir=(0, 0, 1))) as fillet7_piece_10:
        with BuildLine():
            CenterArc((2.6551557133591124, -1.2693626655560193), FILLET7_R, 91.81525494531378, 119.95574465095598)
            ThreePointArc((1.5754533971303504, -1.938050117457313), (0.8498547884410469, -0.9185207351456427), (0, 0))
            ThreePointArc((0, 0), (1.3074630406692571, -0.02071336942930664), (2.6149260813385156, -8e-17))
        make_face()
    extrude(amount=7.80731520334629, mode=Mode.SUBTRACT)
    with BuildSketch(Plane(origin=(-32.14341460501172, 25.89259590173067, 5.08), x_dir=(0.6516730455592312, 0.7584999945231087, 0), z_dir=(0, 0, 1))) as fillet7_piece_11:
        with BuildLine():
            CenterArc((2.6551557133590844, 1.269362665556021), FILLET7_R, 148.22900040373005, 119.9557446509564)
            ThreePointArc((1.5754533971303242, 1.9380501174573181), (0.8498547884410366, 0.9185207351456415), (0, 0))
            ThreePointArc((0, 0), (1.3074630406692533, 0.02071336942930512), (2.6149260813384925, 6e-17))
        make_face()
    extrude(amount=7.807315203346233, mode=Mode.SUBTRACT)
    with BuildSketch(Plane(origin=(-42.48178221863479, -35.16226951556107, 5.08), x_dir=(0.9945508568129161, 0.1042525453535521, 0), z_dir=(0, 0, 1))) as fillet7_piece_12:
        with BuildLine():
            CenterArc((3.378842887065313, -1.2531771116180899), FILLET7_R, 99.33612423193495, 129.67977154849942)
            Line((2.545913867291265, -2.211889397978415), (0, 0))
            ThreePointArc((0, 0), (1.5864079408782357, -0.12953624054069632), (3.172815881756456, 1e-17))
        make_face()
    extrude(amount=9.701389316326848, mode=Mode.SUBTRACT)
    with BuildSketch(Plane(origin=(-32.14341460501172, -25.89259590173067, 5.08), x_dir=(0.6516730455592307, -0.7584999945231092, 0), z_dir=(0, 0, 1))) as fillet7_piece_13:
        with BuildLine():
            CenterArc((2.6551557133590933, -1.2693626655560208), FILLET7_R, 91.81525494531361, 119.9557446509562)
            ThreePointArc((1.575453397130333, -1.938050117457314), (0.84985478844104, -0.9185207351456431), (0, 0))
            ThreePointArc((0, 0), (1.3074630406692458, -0.02071336942930215), (2.6149260813385, 1.9e-16))
        make_face()
    extrude(amount=7.807315203346251, mode=Mode.SUBTRACT)
    with BuildSketch(Plane(origin=(-37.82742730230863, -16.513974951190757, 5.08), x_dir=(-0.3708645160377417, 0.9286869821118909, 0), z_dir=(0, 0, 1))) as fillet7_piece_14:
        with BuildLine():
            CenterArc((2.6551557133591, 1.2693626655560195), FILLET7_R, 148.22900040372966, 119.95574465095666)
            ThreePointArc((1.5754533971303442, 1.9380501174573244), (0.8498547884410458, 0.9185207351456438), (0, 0))
            ThreePointArc((0, 0), (1.307463040669268, 0.02071336942931157), (2.614926081338505, -4e-17))
        make_face()
    extrude(amount=7.807315203346262, mode=Mode.SUBTRACT)
    with BuildSketch(Plane(origin=(-11.47350417406296, -56.87449954927313, 5.08), x_dir=(-0.4270479948817493, 0.904228958874619, 0), z_dir=(0, 0, 1))) as fillet7_piece_15:
        with BuildLine():
            CenterArc((4.728427365439235, 1.2368396432560307), FILLET7_R, 119.71963617143108, 137.15851910421213)
            Line((4.0988168223866115, 2.3397859538609413), (0, 0))
            ThreePointArc((0, 0), (2.220054311822089, 0.2553347469285633), (4.440108623644161, -6e-17))
        make_face()
    extrude(amount=13.069072435303026, mode=Mode.SUBTRACT)
    with BuildSketch(Plane(origin=(-6.897089605429501, -60.078939528203044, 5.08), x_dir=(0.9980757885501166, -0.06200580868001733, 0), z_dir=(0, 0, 1))) as fillet7_piece_16:
        with BuildLine():
            CenterArc((5.337031219122812, -1.2275977109055105), FILLET7_R, 104.84725695810936, 150.14086959564875)
            Line((5.00807682361887, -2.4542553671725873), (4.975181384068476, -2.5769211327992934))
            ThreePointArc((4.975181384068476, -2.5769211327992934), (1.6060241192382974, -1.1309170431421127), (-0.06625343227148527, -0.10834889345188184))
            Line((-0.06625343227148527, -0.10834889345188184), (0.0325428732873341, 0.1227597710905526))
            ThreePointArc((0.0325428732873341, 0.1227597710905526), (2.505801243124729, -0.19949762602756604), (4.979059612962133, 0.12275977109054963))
            Line((4.979059612962133, 0.12275977109054963), (5.011602486249467, 0))
        make_face()
    extrude(amount=15.212785517644045, mode=Mode.SUBTRACT)

    # Fillet8
    fillet8_edges = [part.edges().sort_by_distance(p)[0] for p in [
        (12.872720520102035, 39.21630644784571, 4.762499999999999),
        (12.872720520102039, -39.21630644784571, 4.762499999999999),
    ]]
    fillet(fillet8_edges, radius=FILLET8_R)


solid = part.part
